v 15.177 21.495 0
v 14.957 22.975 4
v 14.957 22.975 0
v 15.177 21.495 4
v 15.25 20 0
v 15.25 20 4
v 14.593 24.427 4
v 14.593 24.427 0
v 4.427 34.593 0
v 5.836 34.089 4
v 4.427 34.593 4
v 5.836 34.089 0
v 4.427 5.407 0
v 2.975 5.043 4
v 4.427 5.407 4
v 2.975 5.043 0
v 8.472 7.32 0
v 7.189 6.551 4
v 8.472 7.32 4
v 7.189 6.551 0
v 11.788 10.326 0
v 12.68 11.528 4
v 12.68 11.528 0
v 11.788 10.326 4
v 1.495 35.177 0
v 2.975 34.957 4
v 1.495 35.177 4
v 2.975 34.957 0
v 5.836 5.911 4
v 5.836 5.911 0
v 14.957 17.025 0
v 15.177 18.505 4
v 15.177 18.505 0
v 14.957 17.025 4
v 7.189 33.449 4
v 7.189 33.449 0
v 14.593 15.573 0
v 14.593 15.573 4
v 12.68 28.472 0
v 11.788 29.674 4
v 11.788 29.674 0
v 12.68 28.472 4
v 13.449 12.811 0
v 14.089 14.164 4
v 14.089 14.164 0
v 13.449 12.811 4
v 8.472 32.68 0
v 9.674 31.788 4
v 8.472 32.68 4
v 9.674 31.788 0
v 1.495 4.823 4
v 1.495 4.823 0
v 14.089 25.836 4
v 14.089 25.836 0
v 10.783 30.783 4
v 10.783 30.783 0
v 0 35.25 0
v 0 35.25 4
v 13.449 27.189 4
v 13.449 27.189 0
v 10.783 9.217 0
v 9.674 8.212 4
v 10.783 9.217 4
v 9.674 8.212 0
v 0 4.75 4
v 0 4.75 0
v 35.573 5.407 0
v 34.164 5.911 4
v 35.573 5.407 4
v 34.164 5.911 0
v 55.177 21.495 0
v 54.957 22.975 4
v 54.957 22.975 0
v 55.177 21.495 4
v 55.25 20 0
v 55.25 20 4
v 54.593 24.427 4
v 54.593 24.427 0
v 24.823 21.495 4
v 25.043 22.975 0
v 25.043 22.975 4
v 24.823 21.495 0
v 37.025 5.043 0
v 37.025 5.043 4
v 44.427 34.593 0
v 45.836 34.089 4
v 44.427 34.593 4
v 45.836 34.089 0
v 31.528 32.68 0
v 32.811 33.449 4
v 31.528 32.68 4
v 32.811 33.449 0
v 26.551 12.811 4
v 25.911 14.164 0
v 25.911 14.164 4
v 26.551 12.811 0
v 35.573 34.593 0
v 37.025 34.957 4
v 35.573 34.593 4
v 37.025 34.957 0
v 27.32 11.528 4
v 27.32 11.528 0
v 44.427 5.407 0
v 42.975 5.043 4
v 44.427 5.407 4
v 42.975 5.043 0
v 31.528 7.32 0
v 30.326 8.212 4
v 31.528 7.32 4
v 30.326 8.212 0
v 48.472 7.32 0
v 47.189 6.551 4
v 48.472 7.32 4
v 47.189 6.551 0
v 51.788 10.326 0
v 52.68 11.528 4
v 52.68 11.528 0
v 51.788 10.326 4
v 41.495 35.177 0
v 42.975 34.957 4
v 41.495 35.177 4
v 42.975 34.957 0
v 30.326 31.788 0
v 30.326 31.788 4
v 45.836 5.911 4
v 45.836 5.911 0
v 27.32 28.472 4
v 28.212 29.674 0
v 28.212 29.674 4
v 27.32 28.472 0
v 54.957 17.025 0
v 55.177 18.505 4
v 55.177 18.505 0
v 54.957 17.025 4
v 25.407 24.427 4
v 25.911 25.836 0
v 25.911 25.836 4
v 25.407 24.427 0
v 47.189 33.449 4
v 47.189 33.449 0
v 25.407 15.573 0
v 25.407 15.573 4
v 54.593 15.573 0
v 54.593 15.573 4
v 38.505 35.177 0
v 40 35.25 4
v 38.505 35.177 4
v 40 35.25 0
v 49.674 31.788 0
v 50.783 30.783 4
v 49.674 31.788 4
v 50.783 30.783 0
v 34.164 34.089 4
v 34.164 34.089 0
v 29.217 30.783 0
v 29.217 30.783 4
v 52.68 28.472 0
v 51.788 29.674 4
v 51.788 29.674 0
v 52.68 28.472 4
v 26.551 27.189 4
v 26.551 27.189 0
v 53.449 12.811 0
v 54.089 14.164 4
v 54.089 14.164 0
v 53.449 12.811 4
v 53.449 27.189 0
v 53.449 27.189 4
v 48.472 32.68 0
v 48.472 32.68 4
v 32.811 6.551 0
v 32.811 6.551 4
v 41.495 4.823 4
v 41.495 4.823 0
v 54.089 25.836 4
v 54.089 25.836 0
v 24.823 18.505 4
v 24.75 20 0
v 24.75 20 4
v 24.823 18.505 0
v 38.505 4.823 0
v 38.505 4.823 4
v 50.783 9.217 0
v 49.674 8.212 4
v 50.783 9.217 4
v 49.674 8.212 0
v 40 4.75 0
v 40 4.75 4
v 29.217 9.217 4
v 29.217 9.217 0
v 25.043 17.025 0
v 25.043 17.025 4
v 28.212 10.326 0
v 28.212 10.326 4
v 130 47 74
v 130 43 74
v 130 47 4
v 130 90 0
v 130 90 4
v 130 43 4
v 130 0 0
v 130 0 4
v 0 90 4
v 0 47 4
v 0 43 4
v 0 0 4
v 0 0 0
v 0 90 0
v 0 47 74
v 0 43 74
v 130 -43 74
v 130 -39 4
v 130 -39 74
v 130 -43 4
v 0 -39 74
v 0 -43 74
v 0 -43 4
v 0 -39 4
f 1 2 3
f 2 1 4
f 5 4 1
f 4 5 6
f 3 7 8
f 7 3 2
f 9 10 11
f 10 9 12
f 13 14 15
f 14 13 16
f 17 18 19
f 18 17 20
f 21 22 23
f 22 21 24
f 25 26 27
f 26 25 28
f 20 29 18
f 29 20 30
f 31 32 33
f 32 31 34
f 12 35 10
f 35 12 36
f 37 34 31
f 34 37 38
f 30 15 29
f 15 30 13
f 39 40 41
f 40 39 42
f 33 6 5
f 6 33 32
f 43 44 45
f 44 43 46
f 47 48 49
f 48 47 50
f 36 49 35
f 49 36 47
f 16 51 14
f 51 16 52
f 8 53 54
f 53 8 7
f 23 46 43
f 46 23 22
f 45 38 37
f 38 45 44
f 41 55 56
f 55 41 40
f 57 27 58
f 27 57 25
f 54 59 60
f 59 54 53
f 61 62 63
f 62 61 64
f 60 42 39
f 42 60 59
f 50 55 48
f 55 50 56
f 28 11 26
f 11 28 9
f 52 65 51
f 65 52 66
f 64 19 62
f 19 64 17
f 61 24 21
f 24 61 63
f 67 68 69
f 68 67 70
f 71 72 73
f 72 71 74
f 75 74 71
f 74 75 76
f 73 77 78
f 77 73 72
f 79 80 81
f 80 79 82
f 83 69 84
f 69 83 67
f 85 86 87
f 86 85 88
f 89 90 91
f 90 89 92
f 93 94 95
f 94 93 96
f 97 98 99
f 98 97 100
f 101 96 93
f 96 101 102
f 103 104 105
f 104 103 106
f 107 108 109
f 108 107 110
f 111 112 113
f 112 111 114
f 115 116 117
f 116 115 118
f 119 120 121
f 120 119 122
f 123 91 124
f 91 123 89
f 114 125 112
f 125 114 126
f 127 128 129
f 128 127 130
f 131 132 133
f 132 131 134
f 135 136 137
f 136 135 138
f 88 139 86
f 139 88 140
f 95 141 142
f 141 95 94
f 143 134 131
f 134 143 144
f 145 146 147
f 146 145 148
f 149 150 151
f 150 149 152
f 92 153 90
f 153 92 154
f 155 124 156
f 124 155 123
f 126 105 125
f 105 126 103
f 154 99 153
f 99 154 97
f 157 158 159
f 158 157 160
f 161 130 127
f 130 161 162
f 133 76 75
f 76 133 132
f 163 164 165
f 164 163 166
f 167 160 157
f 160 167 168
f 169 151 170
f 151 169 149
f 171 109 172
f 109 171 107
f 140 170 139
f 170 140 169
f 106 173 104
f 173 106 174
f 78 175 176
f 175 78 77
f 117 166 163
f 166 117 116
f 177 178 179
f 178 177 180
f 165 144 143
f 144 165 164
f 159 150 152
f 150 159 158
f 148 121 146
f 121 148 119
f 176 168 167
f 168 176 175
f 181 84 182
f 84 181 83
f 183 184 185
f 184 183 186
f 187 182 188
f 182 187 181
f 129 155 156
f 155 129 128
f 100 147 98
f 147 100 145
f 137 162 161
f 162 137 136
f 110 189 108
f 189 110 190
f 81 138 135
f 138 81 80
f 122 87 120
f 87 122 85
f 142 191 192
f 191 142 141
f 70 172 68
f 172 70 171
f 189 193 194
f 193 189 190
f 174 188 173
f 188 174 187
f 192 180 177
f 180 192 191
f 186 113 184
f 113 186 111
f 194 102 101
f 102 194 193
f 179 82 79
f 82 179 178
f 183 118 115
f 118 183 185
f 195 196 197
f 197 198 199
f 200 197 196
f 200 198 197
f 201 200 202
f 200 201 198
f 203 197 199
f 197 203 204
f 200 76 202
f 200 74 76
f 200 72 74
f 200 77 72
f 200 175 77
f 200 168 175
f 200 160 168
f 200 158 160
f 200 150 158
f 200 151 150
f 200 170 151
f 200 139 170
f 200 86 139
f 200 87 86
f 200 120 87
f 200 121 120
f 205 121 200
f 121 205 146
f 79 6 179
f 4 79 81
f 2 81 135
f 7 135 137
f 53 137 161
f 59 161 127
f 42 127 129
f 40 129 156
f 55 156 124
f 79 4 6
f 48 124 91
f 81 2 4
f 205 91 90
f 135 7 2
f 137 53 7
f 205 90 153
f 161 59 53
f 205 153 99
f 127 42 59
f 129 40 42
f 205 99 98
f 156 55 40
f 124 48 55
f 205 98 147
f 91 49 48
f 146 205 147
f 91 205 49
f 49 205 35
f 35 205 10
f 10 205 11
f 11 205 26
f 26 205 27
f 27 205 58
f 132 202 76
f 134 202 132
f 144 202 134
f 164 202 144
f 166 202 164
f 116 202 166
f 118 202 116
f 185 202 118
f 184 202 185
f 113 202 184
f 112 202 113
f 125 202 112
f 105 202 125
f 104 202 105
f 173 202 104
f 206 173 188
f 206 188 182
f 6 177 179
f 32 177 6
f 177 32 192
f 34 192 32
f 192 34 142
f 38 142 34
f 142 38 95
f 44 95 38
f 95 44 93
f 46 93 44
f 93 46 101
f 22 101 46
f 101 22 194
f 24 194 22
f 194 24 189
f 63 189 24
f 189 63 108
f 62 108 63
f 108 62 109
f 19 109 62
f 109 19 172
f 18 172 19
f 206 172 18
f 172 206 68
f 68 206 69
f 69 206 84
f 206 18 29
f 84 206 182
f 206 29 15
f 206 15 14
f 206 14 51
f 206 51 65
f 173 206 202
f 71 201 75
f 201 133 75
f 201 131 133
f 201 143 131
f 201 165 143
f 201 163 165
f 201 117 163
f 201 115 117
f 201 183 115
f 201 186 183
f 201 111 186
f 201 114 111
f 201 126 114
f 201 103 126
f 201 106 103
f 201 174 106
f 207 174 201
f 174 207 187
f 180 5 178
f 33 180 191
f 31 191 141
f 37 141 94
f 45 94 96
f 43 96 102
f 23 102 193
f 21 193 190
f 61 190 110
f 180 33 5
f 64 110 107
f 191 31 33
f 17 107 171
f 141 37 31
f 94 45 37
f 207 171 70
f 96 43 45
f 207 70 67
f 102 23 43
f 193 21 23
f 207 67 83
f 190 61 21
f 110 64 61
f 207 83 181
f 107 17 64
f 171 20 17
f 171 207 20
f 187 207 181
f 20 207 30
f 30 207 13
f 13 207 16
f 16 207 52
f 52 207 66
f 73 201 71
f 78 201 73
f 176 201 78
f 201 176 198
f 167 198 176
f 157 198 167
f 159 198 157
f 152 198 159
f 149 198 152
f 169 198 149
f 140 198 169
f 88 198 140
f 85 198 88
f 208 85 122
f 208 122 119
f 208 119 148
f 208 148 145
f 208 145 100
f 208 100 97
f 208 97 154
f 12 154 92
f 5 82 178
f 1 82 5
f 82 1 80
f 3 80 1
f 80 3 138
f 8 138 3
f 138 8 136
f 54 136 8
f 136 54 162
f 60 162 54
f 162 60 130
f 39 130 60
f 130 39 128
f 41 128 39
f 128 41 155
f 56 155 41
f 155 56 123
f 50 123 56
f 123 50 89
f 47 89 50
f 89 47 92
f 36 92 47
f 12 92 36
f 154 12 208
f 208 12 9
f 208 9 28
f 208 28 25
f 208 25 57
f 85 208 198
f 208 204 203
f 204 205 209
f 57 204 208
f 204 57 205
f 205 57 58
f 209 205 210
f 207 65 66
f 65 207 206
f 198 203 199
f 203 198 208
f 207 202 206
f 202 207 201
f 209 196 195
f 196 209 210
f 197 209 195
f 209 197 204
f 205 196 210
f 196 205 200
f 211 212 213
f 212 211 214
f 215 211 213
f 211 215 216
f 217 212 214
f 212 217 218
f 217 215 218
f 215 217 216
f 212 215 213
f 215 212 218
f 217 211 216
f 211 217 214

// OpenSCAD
// Tube rack for 6x 50 mL conical tubes
// Print orientation: plate on bed, walls rise up. Flipped after print.

// Plate dimensions
plate_x = 130;
plate_y = 90;
plate_z = 4;

// Hole parameters
hole_dia = 30.5;
hole_radius = hole_dia / 2;

// Hole grid: 2 rows (Y), 3 columns (X)
rows = 2;
cols = 3;
pitch_x = 40;
pitch_y = 40;

// Wall parameters
wall_length_x = 130;
wall_thickness_y = 4;
wall_height = 70;

// Global fineness for round holes
$fn = 64;

// Calculate grid offsets to centre the holes on the plate
offset_x = (cols - 1) * pitch_x / 2;
offset_y = (rows - 1) * pitch_y / 2;

module rack() {
    // Plate - centred on origin in X and Y, sitting on bed
    difference() {
        cube([plate_x, plate_y, plate_z], center = false);
        
        // Six through-holes
        for (i = [0 : cols - 1]) {
            for (j = [0 : rows - 1]) {
                translate([
                    -offset_x + i * pitch_x,
                    -offset_y + j * pitch_y,
                    -0.01
                ]) {
                    cylinder(d = hole_dia, h = plate_z + 0.02, center = false);
                }
            }
        }
    }
    
    // Two long walls (along X, at Y = ±plate_y/2)
    // Wall sits on top of plate and extends upward
    // Wall center in Y is at plate_y/2 - wall_thickness_y/2
    translate([0, plate_y/2 - wall_thickness_y/2, plate_z]) {
        cube([wall_length_x, wall_thickness_y, wall_height], center = false);
    }
    
    translate([0, -(plate_y/2 - wall_thickness_y/2), plate_z]) {
        cube([wall_length_x, wall_thickness_y, wall_height], center = false);
    }
}

rack();
